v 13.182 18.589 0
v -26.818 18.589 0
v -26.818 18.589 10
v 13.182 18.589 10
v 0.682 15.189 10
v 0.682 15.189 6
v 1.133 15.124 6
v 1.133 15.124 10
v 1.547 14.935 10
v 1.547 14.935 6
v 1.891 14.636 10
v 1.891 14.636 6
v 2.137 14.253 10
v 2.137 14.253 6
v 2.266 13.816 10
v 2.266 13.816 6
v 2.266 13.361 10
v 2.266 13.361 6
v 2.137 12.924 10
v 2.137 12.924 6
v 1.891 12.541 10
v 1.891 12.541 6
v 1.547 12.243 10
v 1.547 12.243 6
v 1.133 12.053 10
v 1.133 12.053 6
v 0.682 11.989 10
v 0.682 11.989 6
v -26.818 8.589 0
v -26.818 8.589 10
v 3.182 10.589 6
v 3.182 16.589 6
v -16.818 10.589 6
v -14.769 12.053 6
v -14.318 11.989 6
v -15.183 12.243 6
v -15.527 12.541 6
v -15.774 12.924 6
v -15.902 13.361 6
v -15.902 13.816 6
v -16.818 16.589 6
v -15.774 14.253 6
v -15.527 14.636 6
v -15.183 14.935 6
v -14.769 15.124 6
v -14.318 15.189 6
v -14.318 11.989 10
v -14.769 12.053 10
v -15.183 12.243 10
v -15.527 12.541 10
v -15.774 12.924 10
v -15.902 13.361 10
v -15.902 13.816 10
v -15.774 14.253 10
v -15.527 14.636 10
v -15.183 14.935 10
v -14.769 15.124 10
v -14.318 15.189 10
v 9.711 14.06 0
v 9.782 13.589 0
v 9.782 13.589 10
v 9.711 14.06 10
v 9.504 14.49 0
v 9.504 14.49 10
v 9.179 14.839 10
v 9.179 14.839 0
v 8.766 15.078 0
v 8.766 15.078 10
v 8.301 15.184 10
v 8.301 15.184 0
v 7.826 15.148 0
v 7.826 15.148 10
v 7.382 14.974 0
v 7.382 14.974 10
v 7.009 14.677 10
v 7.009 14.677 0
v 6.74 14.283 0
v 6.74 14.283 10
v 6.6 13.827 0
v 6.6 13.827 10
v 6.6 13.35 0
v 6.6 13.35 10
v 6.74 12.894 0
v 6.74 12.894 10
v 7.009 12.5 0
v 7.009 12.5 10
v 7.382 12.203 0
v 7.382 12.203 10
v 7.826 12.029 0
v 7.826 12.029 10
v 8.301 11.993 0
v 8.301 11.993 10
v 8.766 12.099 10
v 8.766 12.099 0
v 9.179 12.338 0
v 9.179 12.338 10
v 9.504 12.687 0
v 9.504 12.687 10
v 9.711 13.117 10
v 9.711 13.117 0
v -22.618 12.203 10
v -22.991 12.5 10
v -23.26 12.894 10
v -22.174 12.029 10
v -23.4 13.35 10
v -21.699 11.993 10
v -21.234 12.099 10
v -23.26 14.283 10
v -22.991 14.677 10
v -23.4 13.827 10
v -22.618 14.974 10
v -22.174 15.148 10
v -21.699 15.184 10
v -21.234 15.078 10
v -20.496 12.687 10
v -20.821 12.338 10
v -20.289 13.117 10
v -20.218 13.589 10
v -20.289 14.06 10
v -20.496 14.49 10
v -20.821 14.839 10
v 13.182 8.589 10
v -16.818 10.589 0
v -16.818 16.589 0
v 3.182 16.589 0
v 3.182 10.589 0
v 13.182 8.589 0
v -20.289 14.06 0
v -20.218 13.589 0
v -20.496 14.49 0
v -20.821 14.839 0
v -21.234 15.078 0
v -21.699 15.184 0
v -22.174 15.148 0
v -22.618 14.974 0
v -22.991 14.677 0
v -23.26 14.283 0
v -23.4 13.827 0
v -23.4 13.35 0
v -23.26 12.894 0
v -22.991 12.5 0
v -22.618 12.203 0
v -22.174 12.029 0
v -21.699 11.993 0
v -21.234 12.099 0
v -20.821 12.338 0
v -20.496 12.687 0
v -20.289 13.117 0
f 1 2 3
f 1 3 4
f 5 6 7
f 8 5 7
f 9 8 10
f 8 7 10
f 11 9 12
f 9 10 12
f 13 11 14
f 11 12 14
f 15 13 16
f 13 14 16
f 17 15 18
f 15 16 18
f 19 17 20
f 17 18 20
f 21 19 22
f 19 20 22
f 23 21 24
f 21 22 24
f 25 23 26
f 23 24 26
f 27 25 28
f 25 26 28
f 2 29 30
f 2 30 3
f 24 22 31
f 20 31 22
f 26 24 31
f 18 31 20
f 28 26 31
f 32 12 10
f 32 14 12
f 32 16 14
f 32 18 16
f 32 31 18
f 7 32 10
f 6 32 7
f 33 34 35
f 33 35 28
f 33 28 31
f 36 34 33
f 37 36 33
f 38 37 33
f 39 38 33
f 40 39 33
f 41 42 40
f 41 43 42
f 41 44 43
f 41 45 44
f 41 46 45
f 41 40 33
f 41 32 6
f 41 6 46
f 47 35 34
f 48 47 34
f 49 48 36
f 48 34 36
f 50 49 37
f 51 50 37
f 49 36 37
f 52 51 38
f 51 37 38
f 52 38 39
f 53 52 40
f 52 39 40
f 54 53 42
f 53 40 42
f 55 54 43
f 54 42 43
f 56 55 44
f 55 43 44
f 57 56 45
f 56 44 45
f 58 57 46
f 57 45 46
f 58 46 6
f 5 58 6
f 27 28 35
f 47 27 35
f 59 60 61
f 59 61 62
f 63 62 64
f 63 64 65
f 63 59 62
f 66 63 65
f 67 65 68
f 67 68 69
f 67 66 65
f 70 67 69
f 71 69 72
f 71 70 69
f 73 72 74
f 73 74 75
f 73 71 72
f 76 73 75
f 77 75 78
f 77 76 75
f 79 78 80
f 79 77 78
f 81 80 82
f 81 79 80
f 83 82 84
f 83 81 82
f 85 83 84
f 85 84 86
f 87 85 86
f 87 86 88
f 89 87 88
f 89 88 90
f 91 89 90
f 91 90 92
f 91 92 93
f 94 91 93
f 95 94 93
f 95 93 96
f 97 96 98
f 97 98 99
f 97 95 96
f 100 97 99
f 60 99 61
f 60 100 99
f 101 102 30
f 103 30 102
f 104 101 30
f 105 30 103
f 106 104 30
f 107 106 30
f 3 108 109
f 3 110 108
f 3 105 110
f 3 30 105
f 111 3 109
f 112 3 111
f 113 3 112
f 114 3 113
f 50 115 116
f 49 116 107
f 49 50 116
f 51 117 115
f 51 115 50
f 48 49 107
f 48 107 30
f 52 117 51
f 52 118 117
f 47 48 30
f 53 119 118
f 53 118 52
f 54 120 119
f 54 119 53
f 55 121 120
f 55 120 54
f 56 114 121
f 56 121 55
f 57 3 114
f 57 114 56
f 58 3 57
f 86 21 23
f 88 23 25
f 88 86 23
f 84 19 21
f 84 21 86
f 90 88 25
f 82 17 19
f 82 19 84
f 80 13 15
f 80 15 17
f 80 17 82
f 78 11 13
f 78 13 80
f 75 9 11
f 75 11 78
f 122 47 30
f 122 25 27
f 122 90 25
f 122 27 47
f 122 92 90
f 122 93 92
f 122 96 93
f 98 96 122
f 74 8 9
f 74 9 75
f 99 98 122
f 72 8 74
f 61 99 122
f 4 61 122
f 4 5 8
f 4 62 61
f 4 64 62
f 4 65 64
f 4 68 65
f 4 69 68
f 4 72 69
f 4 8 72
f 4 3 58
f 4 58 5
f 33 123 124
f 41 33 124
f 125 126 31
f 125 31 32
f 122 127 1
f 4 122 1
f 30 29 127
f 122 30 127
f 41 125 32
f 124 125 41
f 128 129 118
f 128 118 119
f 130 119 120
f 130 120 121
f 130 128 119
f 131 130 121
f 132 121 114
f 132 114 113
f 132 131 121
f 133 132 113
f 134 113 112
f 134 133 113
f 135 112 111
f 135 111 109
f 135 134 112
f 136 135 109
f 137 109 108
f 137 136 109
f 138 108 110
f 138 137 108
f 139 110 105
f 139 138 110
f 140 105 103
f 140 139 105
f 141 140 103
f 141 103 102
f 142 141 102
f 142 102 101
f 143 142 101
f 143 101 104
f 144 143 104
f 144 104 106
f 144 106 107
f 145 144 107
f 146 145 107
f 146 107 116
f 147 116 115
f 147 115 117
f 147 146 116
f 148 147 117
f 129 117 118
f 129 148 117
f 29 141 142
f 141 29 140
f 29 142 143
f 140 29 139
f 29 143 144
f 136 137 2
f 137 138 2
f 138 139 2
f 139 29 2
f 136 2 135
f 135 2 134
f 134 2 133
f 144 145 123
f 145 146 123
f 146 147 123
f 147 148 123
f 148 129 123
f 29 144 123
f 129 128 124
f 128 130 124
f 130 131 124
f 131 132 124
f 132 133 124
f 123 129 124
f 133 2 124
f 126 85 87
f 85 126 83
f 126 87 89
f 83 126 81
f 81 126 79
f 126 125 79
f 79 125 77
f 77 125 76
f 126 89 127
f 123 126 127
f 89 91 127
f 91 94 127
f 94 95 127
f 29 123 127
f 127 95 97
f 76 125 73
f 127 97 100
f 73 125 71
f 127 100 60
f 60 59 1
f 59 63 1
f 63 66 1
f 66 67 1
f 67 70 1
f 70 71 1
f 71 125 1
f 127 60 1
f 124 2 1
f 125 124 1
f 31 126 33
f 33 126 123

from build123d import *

# Parameters (mm, degrees)
SKETCH_1_W          = 40
SKETCH_1_H          = 10
SKETCH_1_R          = 1.6
EXTRUDE_1_DEPTH     = 10
SKETCH_2_W          = 20
SKETCH_2_H          = 6
CUT_EXTRUDE_1_DEPTH = 6


with BuildPart() as part:
    # 草图1 → 凸台-拉伸1 (new body)
    with BuildSketch(Plane.XY):
        with Locations((-6.818181818, 13.588516746)):
            Rectangle(SKETCH_1_W, SKETCH_1_H)
        with Locations((-21.818181818, 13.588516746)):
            Circle(SKETCH_1_R, mode=Mode.SUBTRACT)
        with Locations((8.181818182, 13.588516746)):
            Circle(SKETCH_1_R, mode=Mode.SUBTRACT)
        with BuildLine():
            Line((-14.318181818, 15.188516746), (0.681818182, 15.188516746))
            ThreePointArc((0.681818182, 15.188516746), (2.281818182, 13.588516746), (0.681818182, 11.988516746))
            Line((0.681818182, 11.988516746), (-14.318181818, 11.988516746))
            ThreePointArc((-14.318181818, 11.988516746), (-15.918181818, 13.588516746), (-14.318181818, 15.188516746))
        make_face(mode=Mode.SUBTRACT)
    extrude(amount=EXTRUDE_1_DEPTH)

    # 草图2 → 切除-拉伸1 (cut)
    with BuildSketch(Plane(origin=(0, 0, 0), x_dir=(-1, 0, 0), z_dir=(0, 0, -1))):
        with Locations((6.818181818, 13.588516746)):
            Rectangle(SKETCH_2_W, SKETCH_2_H)
    extrude(amount=-CUT_EXTRUDE_1_DEPTH, mode=Mode.SUBTRACT)


solid = part.part
